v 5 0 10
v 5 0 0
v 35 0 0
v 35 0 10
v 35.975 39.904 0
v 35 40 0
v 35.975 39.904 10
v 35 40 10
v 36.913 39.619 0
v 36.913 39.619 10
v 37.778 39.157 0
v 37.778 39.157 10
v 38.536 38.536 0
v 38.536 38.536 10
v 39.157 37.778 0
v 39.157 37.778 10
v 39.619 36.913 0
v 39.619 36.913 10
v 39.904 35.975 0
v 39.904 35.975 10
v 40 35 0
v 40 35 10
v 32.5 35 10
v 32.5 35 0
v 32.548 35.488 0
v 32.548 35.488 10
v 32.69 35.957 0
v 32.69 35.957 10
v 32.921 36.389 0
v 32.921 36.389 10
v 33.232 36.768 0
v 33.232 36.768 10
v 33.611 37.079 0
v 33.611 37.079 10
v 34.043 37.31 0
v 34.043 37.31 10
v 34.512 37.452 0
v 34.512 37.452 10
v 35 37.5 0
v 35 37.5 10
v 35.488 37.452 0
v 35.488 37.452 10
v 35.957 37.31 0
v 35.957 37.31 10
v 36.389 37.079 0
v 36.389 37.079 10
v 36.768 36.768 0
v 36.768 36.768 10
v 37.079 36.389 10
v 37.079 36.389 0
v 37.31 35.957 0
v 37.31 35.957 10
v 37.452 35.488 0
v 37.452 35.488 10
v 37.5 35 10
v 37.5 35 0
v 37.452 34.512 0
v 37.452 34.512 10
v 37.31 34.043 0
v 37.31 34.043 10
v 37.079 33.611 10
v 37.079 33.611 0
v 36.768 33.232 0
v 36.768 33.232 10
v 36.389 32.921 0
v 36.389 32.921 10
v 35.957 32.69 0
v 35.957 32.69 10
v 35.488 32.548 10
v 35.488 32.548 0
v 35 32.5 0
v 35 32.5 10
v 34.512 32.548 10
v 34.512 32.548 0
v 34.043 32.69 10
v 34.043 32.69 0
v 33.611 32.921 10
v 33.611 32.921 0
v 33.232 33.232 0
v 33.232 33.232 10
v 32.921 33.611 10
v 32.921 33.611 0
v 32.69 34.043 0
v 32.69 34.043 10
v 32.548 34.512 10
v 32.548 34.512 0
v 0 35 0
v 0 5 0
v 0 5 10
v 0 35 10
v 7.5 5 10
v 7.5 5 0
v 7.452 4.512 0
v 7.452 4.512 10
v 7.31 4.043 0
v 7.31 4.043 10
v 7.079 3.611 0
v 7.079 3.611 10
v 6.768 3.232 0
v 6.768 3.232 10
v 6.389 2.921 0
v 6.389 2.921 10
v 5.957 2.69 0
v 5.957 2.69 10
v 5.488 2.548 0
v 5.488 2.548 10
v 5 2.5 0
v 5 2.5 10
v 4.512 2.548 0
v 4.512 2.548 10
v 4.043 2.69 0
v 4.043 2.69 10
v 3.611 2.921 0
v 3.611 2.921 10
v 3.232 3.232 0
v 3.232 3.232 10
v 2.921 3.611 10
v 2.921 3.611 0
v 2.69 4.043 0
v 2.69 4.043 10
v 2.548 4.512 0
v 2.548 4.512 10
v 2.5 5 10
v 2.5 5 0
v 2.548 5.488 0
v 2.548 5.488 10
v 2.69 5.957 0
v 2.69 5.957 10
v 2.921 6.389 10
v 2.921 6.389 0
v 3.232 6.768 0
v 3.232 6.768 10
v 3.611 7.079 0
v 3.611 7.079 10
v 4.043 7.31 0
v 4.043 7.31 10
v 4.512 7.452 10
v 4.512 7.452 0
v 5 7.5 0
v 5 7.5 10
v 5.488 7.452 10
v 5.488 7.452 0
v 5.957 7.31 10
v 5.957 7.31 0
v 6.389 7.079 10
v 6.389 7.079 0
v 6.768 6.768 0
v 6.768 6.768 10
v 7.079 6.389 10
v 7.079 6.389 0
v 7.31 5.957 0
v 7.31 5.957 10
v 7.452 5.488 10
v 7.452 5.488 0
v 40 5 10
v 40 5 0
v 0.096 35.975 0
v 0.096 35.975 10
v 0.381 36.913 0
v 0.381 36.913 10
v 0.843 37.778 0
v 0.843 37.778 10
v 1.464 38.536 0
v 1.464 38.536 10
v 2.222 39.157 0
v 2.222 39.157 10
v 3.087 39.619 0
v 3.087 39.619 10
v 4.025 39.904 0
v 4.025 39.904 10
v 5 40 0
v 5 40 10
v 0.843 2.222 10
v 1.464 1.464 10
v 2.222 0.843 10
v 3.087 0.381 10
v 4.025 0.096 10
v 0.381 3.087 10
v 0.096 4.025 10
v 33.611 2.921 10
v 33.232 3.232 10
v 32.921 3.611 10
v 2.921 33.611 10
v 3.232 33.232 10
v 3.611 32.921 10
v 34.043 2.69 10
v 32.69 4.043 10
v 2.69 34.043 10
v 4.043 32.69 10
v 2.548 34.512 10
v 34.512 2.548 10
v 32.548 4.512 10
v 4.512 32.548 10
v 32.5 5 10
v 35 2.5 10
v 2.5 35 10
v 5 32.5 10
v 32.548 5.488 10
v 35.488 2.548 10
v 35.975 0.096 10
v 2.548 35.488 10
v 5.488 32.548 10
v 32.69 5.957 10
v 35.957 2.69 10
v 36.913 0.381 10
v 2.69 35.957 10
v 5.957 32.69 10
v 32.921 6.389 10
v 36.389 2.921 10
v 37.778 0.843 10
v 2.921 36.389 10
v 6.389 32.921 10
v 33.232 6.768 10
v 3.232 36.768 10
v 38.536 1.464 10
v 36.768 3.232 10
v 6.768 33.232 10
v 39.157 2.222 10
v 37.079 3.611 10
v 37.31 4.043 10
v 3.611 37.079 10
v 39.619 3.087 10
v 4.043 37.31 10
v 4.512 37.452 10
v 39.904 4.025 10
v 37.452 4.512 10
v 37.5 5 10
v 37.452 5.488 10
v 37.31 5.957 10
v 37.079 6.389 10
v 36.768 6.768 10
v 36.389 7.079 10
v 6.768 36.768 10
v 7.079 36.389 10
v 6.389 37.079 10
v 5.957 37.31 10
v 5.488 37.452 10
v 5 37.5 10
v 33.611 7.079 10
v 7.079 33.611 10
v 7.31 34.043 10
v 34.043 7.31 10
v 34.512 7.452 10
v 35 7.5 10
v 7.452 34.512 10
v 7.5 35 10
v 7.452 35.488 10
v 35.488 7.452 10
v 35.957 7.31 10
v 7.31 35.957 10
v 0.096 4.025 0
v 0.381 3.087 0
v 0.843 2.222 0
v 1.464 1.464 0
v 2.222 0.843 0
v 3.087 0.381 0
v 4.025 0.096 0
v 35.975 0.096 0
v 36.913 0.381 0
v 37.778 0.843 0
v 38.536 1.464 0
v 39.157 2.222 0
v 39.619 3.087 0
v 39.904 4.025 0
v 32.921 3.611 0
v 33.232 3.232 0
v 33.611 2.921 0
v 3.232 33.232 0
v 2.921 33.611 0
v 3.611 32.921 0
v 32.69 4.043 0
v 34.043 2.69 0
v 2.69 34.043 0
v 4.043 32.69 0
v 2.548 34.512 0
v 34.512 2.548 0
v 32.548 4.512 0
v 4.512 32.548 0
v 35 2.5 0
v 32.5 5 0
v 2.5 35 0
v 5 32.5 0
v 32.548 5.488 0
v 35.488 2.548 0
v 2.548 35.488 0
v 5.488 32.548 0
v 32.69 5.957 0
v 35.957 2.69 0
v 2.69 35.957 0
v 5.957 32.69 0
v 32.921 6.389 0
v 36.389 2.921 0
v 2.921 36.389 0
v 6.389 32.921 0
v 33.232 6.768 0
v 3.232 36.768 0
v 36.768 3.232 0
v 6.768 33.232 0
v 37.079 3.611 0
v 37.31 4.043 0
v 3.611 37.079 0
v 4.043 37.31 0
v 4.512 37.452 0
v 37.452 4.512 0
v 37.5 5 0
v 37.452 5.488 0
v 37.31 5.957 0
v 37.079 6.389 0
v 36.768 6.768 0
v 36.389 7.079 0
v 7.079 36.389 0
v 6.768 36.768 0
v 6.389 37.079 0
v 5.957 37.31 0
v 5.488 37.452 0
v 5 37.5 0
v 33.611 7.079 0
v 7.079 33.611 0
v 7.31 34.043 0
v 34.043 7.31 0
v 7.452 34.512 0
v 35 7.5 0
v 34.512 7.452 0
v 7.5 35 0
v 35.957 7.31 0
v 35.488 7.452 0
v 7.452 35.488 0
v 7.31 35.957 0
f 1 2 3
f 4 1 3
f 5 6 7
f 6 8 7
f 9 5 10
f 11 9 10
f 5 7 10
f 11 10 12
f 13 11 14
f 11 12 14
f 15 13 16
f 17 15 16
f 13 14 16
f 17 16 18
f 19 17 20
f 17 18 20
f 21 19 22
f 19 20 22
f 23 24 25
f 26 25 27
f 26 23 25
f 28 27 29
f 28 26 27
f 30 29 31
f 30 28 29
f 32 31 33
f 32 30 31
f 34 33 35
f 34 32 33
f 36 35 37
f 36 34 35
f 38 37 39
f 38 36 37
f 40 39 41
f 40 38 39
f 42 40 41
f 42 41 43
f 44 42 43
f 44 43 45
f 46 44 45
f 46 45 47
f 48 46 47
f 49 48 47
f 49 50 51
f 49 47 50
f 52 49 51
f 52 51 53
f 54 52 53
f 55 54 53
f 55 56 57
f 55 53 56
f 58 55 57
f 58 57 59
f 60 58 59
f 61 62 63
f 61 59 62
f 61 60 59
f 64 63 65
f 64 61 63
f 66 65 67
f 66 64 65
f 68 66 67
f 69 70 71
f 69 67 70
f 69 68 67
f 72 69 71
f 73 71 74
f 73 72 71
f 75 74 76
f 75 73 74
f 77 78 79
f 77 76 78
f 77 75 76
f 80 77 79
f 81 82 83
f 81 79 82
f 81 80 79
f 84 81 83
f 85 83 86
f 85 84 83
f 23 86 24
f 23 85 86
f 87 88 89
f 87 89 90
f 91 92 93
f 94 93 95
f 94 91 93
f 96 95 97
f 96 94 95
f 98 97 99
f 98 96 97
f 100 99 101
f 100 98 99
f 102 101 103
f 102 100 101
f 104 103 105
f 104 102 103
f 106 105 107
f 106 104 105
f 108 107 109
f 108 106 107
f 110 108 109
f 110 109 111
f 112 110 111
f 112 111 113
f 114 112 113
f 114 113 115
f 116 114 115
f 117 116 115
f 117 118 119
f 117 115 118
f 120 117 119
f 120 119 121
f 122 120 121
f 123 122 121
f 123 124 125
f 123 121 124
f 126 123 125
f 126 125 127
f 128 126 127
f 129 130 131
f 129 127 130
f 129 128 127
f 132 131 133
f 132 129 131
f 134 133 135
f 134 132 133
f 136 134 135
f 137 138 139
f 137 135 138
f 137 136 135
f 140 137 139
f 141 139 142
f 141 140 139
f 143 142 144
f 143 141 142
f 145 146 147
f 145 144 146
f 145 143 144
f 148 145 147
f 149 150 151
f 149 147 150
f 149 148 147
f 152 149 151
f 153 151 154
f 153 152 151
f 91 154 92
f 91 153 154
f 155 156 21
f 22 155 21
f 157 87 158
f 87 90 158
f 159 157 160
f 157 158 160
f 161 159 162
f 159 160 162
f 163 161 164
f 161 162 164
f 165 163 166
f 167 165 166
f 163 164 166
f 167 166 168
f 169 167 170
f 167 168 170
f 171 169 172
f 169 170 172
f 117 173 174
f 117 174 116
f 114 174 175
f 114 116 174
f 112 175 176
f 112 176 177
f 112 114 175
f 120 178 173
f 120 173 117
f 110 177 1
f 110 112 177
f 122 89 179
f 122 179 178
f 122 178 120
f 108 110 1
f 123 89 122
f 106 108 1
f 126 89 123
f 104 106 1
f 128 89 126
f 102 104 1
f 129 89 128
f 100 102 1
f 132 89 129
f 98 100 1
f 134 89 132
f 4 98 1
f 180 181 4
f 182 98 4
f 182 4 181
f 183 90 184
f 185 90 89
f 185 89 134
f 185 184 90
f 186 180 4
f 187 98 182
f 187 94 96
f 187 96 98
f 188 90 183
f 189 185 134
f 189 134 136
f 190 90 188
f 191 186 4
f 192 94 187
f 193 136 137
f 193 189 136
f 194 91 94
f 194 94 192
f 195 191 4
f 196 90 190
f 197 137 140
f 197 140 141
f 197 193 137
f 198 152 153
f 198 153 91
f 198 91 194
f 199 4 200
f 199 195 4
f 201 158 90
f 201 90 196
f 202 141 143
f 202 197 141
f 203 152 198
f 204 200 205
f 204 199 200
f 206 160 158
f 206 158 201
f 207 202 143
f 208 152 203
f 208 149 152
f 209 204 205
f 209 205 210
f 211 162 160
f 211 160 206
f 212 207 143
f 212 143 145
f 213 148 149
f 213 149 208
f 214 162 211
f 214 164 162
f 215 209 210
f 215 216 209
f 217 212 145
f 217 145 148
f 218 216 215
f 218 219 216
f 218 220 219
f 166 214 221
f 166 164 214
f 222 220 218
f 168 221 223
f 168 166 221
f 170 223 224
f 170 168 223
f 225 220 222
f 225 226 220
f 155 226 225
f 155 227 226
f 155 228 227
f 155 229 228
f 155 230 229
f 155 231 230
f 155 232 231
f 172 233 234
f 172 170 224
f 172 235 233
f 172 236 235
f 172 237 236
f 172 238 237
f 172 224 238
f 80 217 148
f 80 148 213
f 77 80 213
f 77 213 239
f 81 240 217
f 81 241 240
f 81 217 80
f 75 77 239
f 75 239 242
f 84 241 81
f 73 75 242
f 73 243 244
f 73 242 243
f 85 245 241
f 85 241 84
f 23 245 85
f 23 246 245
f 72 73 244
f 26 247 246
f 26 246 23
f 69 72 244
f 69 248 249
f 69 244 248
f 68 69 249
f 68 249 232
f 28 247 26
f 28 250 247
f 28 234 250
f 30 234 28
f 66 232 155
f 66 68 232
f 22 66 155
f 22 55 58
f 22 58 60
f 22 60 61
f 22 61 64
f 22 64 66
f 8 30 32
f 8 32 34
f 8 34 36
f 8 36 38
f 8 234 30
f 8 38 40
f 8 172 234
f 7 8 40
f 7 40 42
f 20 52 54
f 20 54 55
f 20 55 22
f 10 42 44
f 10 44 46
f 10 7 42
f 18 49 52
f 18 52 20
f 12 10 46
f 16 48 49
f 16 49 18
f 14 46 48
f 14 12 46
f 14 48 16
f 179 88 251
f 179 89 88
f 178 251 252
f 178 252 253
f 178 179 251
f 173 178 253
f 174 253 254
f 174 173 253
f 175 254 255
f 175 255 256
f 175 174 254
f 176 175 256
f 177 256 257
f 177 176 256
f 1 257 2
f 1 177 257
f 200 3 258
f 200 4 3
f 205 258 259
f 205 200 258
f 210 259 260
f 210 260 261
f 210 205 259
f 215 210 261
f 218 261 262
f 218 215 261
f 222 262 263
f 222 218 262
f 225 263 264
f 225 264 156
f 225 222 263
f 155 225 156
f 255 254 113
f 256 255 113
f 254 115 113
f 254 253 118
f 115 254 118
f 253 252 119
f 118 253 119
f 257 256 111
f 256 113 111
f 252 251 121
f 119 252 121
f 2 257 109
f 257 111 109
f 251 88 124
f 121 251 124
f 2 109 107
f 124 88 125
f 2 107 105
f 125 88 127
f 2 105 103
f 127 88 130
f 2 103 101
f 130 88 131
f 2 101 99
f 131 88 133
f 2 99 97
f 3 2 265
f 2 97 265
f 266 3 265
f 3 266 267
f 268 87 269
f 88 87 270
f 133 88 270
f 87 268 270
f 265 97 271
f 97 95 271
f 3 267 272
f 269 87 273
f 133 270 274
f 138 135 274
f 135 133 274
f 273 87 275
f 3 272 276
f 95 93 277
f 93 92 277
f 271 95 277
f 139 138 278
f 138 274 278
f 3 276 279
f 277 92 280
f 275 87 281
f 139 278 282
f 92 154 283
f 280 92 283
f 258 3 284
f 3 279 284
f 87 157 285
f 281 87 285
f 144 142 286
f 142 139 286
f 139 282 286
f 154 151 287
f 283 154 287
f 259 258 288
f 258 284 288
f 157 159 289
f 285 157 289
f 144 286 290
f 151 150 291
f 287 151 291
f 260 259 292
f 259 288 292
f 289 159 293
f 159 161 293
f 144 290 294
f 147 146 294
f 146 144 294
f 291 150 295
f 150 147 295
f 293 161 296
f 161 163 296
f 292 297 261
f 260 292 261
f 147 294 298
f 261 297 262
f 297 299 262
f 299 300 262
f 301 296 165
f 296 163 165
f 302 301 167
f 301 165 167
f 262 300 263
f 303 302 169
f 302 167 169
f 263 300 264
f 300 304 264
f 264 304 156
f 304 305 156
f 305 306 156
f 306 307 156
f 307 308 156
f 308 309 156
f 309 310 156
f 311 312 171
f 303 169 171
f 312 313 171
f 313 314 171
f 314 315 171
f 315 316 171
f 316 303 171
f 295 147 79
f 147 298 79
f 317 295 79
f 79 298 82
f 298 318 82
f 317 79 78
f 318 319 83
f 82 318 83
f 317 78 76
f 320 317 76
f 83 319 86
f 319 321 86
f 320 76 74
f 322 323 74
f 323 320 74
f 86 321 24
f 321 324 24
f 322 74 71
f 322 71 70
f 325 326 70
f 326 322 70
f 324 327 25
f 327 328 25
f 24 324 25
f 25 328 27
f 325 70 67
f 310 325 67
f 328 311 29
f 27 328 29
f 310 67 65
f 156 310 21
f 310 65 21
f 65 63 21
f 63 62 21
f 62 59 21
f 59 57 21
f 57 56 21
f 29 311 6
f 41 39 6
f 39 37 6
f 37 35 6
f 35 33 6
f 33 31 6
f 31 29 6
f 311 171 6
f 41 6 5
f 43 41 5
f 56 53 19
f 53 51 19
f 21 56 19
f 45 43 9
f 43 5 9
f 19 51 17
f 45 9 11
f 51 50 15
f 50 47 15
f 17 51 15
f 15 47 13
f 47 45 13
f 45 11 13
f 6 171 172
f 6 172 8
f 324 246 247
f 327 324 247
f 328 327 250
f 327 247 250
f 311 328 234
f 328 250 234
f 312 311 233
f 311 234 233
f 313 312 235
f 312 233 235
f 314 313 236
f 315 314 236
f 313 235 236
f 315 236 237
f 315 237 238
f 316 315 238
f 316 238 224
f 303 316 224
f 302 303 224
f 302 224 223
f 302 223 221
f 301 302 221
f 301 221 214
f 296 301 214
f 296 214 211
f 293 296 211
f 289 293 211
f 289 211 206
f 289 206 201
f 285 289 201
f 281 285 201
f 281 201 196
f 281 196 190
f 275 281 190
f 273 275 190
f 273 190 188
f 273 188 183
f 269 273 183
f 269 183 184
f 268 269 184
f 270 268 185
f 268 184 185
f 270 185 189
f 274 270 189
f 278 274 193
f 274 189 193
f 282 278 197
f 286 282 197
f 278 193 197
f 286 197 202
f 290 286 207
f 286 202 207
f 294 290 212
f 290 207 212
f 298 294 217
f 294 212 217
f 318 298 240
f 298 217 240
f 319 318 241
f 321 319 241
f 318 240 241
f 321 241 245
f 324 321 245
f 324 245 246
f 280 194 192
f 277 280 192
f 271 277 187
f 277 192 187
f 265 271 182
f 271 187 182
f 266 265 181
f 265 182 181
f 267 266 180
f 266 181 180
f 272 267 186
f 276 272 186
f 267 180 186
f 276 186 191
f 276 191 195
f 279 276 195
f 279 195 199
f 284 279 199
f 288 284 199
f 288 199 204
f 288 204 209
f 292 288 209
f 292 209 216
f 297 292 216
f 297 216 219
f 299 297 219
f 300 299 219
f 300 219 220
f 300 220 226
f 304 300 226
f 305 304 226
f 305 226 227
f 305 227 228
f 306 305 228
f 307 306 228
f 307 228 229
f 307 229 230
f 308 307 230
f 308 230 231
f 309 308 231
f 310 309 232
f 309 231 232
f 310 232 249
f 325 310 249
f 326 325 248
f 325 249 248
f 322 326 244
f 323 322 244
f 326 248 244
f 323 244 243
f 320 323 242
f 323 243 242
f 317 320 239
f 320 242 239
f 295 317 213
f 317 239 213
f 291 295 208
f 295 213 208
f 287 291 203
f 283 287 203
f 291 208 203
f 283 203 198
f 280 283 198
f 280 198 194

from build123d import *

# Parameters (mm, degrees)
SKETCH1_W               = 40
SKETCH1_H               = 40
BOSS_EXTRUDE1_DEPTH     = 10
SKETCH2_R               = 2.5
CUT_EXTRUDE1_DEPTH      = 11
MIRROR2_COPY_1_SKETCH_R = 2.5
MIRROR2_COPY_1_DEPTH    = 11
FILLET2_R               = 5


with BuildPart() as part:
    # Sketch1 → Boss-Extrude1 (new body)
    with BuildSketch(Plane.XY):
        with Locations((20, 20)):
            Rectangle(SKETCH1_W, SKETCH1_H)
    extrude(amount=BOSS_EXTRUDE1_DEPTH)

    # Sketch2 → Cut-Extrude1 (cut, through all)
    with BuildSketch(Plane.XY.offset(10)):
        with Locations((5, 35)):
            Circle(SKETCH2_R)
    cut_extrude1 = extrude(amount=-CUT_EXTRUDE1_DEPTH, mode=Mode.SUBTRACT)

    # Mirror1: Cut-Extrude1 across plane
    add(cut_extrude1.mirror(Plane.ZX.offset(20)), mode=Mode.SUBTRACT)

    # Mirror2: Cut-Extrude1 across plane
    add(cut_extrude1.mirror(Plane(origin=(20, 0, 0), x_dir=(0, 0, 1), z_dir=(1, 0, 0))), mode=Mode.SUBTRACT)

    # Mirror2 copy 1 sketch → Mirror2 copy 1 (cut, through all)
    with BuildSketch(Plane(origin=(40, 40, 10), x_dir=(-1, 0, 0), z_dir=(0, 0, 1))):
        with Locations((5, 35)):
            Circle(MIRROR2_COPY_1_SKETCH_R)
    extrude(amount=-MIRROR2_COPY_1_DEPTH, mode=Mode.SUBTRACT)

    # Fillet2
    fillet2_edges = [part.edges().sort_by_distance(p)[0] for p in [
        (0, 40, 5),
        (40, 40, 5),
        (40, 0, 5),
        (0, 0, 5),
    ]]
    fillet(fillet2_edges, radius=FILLET2_R)


solid = part.part
